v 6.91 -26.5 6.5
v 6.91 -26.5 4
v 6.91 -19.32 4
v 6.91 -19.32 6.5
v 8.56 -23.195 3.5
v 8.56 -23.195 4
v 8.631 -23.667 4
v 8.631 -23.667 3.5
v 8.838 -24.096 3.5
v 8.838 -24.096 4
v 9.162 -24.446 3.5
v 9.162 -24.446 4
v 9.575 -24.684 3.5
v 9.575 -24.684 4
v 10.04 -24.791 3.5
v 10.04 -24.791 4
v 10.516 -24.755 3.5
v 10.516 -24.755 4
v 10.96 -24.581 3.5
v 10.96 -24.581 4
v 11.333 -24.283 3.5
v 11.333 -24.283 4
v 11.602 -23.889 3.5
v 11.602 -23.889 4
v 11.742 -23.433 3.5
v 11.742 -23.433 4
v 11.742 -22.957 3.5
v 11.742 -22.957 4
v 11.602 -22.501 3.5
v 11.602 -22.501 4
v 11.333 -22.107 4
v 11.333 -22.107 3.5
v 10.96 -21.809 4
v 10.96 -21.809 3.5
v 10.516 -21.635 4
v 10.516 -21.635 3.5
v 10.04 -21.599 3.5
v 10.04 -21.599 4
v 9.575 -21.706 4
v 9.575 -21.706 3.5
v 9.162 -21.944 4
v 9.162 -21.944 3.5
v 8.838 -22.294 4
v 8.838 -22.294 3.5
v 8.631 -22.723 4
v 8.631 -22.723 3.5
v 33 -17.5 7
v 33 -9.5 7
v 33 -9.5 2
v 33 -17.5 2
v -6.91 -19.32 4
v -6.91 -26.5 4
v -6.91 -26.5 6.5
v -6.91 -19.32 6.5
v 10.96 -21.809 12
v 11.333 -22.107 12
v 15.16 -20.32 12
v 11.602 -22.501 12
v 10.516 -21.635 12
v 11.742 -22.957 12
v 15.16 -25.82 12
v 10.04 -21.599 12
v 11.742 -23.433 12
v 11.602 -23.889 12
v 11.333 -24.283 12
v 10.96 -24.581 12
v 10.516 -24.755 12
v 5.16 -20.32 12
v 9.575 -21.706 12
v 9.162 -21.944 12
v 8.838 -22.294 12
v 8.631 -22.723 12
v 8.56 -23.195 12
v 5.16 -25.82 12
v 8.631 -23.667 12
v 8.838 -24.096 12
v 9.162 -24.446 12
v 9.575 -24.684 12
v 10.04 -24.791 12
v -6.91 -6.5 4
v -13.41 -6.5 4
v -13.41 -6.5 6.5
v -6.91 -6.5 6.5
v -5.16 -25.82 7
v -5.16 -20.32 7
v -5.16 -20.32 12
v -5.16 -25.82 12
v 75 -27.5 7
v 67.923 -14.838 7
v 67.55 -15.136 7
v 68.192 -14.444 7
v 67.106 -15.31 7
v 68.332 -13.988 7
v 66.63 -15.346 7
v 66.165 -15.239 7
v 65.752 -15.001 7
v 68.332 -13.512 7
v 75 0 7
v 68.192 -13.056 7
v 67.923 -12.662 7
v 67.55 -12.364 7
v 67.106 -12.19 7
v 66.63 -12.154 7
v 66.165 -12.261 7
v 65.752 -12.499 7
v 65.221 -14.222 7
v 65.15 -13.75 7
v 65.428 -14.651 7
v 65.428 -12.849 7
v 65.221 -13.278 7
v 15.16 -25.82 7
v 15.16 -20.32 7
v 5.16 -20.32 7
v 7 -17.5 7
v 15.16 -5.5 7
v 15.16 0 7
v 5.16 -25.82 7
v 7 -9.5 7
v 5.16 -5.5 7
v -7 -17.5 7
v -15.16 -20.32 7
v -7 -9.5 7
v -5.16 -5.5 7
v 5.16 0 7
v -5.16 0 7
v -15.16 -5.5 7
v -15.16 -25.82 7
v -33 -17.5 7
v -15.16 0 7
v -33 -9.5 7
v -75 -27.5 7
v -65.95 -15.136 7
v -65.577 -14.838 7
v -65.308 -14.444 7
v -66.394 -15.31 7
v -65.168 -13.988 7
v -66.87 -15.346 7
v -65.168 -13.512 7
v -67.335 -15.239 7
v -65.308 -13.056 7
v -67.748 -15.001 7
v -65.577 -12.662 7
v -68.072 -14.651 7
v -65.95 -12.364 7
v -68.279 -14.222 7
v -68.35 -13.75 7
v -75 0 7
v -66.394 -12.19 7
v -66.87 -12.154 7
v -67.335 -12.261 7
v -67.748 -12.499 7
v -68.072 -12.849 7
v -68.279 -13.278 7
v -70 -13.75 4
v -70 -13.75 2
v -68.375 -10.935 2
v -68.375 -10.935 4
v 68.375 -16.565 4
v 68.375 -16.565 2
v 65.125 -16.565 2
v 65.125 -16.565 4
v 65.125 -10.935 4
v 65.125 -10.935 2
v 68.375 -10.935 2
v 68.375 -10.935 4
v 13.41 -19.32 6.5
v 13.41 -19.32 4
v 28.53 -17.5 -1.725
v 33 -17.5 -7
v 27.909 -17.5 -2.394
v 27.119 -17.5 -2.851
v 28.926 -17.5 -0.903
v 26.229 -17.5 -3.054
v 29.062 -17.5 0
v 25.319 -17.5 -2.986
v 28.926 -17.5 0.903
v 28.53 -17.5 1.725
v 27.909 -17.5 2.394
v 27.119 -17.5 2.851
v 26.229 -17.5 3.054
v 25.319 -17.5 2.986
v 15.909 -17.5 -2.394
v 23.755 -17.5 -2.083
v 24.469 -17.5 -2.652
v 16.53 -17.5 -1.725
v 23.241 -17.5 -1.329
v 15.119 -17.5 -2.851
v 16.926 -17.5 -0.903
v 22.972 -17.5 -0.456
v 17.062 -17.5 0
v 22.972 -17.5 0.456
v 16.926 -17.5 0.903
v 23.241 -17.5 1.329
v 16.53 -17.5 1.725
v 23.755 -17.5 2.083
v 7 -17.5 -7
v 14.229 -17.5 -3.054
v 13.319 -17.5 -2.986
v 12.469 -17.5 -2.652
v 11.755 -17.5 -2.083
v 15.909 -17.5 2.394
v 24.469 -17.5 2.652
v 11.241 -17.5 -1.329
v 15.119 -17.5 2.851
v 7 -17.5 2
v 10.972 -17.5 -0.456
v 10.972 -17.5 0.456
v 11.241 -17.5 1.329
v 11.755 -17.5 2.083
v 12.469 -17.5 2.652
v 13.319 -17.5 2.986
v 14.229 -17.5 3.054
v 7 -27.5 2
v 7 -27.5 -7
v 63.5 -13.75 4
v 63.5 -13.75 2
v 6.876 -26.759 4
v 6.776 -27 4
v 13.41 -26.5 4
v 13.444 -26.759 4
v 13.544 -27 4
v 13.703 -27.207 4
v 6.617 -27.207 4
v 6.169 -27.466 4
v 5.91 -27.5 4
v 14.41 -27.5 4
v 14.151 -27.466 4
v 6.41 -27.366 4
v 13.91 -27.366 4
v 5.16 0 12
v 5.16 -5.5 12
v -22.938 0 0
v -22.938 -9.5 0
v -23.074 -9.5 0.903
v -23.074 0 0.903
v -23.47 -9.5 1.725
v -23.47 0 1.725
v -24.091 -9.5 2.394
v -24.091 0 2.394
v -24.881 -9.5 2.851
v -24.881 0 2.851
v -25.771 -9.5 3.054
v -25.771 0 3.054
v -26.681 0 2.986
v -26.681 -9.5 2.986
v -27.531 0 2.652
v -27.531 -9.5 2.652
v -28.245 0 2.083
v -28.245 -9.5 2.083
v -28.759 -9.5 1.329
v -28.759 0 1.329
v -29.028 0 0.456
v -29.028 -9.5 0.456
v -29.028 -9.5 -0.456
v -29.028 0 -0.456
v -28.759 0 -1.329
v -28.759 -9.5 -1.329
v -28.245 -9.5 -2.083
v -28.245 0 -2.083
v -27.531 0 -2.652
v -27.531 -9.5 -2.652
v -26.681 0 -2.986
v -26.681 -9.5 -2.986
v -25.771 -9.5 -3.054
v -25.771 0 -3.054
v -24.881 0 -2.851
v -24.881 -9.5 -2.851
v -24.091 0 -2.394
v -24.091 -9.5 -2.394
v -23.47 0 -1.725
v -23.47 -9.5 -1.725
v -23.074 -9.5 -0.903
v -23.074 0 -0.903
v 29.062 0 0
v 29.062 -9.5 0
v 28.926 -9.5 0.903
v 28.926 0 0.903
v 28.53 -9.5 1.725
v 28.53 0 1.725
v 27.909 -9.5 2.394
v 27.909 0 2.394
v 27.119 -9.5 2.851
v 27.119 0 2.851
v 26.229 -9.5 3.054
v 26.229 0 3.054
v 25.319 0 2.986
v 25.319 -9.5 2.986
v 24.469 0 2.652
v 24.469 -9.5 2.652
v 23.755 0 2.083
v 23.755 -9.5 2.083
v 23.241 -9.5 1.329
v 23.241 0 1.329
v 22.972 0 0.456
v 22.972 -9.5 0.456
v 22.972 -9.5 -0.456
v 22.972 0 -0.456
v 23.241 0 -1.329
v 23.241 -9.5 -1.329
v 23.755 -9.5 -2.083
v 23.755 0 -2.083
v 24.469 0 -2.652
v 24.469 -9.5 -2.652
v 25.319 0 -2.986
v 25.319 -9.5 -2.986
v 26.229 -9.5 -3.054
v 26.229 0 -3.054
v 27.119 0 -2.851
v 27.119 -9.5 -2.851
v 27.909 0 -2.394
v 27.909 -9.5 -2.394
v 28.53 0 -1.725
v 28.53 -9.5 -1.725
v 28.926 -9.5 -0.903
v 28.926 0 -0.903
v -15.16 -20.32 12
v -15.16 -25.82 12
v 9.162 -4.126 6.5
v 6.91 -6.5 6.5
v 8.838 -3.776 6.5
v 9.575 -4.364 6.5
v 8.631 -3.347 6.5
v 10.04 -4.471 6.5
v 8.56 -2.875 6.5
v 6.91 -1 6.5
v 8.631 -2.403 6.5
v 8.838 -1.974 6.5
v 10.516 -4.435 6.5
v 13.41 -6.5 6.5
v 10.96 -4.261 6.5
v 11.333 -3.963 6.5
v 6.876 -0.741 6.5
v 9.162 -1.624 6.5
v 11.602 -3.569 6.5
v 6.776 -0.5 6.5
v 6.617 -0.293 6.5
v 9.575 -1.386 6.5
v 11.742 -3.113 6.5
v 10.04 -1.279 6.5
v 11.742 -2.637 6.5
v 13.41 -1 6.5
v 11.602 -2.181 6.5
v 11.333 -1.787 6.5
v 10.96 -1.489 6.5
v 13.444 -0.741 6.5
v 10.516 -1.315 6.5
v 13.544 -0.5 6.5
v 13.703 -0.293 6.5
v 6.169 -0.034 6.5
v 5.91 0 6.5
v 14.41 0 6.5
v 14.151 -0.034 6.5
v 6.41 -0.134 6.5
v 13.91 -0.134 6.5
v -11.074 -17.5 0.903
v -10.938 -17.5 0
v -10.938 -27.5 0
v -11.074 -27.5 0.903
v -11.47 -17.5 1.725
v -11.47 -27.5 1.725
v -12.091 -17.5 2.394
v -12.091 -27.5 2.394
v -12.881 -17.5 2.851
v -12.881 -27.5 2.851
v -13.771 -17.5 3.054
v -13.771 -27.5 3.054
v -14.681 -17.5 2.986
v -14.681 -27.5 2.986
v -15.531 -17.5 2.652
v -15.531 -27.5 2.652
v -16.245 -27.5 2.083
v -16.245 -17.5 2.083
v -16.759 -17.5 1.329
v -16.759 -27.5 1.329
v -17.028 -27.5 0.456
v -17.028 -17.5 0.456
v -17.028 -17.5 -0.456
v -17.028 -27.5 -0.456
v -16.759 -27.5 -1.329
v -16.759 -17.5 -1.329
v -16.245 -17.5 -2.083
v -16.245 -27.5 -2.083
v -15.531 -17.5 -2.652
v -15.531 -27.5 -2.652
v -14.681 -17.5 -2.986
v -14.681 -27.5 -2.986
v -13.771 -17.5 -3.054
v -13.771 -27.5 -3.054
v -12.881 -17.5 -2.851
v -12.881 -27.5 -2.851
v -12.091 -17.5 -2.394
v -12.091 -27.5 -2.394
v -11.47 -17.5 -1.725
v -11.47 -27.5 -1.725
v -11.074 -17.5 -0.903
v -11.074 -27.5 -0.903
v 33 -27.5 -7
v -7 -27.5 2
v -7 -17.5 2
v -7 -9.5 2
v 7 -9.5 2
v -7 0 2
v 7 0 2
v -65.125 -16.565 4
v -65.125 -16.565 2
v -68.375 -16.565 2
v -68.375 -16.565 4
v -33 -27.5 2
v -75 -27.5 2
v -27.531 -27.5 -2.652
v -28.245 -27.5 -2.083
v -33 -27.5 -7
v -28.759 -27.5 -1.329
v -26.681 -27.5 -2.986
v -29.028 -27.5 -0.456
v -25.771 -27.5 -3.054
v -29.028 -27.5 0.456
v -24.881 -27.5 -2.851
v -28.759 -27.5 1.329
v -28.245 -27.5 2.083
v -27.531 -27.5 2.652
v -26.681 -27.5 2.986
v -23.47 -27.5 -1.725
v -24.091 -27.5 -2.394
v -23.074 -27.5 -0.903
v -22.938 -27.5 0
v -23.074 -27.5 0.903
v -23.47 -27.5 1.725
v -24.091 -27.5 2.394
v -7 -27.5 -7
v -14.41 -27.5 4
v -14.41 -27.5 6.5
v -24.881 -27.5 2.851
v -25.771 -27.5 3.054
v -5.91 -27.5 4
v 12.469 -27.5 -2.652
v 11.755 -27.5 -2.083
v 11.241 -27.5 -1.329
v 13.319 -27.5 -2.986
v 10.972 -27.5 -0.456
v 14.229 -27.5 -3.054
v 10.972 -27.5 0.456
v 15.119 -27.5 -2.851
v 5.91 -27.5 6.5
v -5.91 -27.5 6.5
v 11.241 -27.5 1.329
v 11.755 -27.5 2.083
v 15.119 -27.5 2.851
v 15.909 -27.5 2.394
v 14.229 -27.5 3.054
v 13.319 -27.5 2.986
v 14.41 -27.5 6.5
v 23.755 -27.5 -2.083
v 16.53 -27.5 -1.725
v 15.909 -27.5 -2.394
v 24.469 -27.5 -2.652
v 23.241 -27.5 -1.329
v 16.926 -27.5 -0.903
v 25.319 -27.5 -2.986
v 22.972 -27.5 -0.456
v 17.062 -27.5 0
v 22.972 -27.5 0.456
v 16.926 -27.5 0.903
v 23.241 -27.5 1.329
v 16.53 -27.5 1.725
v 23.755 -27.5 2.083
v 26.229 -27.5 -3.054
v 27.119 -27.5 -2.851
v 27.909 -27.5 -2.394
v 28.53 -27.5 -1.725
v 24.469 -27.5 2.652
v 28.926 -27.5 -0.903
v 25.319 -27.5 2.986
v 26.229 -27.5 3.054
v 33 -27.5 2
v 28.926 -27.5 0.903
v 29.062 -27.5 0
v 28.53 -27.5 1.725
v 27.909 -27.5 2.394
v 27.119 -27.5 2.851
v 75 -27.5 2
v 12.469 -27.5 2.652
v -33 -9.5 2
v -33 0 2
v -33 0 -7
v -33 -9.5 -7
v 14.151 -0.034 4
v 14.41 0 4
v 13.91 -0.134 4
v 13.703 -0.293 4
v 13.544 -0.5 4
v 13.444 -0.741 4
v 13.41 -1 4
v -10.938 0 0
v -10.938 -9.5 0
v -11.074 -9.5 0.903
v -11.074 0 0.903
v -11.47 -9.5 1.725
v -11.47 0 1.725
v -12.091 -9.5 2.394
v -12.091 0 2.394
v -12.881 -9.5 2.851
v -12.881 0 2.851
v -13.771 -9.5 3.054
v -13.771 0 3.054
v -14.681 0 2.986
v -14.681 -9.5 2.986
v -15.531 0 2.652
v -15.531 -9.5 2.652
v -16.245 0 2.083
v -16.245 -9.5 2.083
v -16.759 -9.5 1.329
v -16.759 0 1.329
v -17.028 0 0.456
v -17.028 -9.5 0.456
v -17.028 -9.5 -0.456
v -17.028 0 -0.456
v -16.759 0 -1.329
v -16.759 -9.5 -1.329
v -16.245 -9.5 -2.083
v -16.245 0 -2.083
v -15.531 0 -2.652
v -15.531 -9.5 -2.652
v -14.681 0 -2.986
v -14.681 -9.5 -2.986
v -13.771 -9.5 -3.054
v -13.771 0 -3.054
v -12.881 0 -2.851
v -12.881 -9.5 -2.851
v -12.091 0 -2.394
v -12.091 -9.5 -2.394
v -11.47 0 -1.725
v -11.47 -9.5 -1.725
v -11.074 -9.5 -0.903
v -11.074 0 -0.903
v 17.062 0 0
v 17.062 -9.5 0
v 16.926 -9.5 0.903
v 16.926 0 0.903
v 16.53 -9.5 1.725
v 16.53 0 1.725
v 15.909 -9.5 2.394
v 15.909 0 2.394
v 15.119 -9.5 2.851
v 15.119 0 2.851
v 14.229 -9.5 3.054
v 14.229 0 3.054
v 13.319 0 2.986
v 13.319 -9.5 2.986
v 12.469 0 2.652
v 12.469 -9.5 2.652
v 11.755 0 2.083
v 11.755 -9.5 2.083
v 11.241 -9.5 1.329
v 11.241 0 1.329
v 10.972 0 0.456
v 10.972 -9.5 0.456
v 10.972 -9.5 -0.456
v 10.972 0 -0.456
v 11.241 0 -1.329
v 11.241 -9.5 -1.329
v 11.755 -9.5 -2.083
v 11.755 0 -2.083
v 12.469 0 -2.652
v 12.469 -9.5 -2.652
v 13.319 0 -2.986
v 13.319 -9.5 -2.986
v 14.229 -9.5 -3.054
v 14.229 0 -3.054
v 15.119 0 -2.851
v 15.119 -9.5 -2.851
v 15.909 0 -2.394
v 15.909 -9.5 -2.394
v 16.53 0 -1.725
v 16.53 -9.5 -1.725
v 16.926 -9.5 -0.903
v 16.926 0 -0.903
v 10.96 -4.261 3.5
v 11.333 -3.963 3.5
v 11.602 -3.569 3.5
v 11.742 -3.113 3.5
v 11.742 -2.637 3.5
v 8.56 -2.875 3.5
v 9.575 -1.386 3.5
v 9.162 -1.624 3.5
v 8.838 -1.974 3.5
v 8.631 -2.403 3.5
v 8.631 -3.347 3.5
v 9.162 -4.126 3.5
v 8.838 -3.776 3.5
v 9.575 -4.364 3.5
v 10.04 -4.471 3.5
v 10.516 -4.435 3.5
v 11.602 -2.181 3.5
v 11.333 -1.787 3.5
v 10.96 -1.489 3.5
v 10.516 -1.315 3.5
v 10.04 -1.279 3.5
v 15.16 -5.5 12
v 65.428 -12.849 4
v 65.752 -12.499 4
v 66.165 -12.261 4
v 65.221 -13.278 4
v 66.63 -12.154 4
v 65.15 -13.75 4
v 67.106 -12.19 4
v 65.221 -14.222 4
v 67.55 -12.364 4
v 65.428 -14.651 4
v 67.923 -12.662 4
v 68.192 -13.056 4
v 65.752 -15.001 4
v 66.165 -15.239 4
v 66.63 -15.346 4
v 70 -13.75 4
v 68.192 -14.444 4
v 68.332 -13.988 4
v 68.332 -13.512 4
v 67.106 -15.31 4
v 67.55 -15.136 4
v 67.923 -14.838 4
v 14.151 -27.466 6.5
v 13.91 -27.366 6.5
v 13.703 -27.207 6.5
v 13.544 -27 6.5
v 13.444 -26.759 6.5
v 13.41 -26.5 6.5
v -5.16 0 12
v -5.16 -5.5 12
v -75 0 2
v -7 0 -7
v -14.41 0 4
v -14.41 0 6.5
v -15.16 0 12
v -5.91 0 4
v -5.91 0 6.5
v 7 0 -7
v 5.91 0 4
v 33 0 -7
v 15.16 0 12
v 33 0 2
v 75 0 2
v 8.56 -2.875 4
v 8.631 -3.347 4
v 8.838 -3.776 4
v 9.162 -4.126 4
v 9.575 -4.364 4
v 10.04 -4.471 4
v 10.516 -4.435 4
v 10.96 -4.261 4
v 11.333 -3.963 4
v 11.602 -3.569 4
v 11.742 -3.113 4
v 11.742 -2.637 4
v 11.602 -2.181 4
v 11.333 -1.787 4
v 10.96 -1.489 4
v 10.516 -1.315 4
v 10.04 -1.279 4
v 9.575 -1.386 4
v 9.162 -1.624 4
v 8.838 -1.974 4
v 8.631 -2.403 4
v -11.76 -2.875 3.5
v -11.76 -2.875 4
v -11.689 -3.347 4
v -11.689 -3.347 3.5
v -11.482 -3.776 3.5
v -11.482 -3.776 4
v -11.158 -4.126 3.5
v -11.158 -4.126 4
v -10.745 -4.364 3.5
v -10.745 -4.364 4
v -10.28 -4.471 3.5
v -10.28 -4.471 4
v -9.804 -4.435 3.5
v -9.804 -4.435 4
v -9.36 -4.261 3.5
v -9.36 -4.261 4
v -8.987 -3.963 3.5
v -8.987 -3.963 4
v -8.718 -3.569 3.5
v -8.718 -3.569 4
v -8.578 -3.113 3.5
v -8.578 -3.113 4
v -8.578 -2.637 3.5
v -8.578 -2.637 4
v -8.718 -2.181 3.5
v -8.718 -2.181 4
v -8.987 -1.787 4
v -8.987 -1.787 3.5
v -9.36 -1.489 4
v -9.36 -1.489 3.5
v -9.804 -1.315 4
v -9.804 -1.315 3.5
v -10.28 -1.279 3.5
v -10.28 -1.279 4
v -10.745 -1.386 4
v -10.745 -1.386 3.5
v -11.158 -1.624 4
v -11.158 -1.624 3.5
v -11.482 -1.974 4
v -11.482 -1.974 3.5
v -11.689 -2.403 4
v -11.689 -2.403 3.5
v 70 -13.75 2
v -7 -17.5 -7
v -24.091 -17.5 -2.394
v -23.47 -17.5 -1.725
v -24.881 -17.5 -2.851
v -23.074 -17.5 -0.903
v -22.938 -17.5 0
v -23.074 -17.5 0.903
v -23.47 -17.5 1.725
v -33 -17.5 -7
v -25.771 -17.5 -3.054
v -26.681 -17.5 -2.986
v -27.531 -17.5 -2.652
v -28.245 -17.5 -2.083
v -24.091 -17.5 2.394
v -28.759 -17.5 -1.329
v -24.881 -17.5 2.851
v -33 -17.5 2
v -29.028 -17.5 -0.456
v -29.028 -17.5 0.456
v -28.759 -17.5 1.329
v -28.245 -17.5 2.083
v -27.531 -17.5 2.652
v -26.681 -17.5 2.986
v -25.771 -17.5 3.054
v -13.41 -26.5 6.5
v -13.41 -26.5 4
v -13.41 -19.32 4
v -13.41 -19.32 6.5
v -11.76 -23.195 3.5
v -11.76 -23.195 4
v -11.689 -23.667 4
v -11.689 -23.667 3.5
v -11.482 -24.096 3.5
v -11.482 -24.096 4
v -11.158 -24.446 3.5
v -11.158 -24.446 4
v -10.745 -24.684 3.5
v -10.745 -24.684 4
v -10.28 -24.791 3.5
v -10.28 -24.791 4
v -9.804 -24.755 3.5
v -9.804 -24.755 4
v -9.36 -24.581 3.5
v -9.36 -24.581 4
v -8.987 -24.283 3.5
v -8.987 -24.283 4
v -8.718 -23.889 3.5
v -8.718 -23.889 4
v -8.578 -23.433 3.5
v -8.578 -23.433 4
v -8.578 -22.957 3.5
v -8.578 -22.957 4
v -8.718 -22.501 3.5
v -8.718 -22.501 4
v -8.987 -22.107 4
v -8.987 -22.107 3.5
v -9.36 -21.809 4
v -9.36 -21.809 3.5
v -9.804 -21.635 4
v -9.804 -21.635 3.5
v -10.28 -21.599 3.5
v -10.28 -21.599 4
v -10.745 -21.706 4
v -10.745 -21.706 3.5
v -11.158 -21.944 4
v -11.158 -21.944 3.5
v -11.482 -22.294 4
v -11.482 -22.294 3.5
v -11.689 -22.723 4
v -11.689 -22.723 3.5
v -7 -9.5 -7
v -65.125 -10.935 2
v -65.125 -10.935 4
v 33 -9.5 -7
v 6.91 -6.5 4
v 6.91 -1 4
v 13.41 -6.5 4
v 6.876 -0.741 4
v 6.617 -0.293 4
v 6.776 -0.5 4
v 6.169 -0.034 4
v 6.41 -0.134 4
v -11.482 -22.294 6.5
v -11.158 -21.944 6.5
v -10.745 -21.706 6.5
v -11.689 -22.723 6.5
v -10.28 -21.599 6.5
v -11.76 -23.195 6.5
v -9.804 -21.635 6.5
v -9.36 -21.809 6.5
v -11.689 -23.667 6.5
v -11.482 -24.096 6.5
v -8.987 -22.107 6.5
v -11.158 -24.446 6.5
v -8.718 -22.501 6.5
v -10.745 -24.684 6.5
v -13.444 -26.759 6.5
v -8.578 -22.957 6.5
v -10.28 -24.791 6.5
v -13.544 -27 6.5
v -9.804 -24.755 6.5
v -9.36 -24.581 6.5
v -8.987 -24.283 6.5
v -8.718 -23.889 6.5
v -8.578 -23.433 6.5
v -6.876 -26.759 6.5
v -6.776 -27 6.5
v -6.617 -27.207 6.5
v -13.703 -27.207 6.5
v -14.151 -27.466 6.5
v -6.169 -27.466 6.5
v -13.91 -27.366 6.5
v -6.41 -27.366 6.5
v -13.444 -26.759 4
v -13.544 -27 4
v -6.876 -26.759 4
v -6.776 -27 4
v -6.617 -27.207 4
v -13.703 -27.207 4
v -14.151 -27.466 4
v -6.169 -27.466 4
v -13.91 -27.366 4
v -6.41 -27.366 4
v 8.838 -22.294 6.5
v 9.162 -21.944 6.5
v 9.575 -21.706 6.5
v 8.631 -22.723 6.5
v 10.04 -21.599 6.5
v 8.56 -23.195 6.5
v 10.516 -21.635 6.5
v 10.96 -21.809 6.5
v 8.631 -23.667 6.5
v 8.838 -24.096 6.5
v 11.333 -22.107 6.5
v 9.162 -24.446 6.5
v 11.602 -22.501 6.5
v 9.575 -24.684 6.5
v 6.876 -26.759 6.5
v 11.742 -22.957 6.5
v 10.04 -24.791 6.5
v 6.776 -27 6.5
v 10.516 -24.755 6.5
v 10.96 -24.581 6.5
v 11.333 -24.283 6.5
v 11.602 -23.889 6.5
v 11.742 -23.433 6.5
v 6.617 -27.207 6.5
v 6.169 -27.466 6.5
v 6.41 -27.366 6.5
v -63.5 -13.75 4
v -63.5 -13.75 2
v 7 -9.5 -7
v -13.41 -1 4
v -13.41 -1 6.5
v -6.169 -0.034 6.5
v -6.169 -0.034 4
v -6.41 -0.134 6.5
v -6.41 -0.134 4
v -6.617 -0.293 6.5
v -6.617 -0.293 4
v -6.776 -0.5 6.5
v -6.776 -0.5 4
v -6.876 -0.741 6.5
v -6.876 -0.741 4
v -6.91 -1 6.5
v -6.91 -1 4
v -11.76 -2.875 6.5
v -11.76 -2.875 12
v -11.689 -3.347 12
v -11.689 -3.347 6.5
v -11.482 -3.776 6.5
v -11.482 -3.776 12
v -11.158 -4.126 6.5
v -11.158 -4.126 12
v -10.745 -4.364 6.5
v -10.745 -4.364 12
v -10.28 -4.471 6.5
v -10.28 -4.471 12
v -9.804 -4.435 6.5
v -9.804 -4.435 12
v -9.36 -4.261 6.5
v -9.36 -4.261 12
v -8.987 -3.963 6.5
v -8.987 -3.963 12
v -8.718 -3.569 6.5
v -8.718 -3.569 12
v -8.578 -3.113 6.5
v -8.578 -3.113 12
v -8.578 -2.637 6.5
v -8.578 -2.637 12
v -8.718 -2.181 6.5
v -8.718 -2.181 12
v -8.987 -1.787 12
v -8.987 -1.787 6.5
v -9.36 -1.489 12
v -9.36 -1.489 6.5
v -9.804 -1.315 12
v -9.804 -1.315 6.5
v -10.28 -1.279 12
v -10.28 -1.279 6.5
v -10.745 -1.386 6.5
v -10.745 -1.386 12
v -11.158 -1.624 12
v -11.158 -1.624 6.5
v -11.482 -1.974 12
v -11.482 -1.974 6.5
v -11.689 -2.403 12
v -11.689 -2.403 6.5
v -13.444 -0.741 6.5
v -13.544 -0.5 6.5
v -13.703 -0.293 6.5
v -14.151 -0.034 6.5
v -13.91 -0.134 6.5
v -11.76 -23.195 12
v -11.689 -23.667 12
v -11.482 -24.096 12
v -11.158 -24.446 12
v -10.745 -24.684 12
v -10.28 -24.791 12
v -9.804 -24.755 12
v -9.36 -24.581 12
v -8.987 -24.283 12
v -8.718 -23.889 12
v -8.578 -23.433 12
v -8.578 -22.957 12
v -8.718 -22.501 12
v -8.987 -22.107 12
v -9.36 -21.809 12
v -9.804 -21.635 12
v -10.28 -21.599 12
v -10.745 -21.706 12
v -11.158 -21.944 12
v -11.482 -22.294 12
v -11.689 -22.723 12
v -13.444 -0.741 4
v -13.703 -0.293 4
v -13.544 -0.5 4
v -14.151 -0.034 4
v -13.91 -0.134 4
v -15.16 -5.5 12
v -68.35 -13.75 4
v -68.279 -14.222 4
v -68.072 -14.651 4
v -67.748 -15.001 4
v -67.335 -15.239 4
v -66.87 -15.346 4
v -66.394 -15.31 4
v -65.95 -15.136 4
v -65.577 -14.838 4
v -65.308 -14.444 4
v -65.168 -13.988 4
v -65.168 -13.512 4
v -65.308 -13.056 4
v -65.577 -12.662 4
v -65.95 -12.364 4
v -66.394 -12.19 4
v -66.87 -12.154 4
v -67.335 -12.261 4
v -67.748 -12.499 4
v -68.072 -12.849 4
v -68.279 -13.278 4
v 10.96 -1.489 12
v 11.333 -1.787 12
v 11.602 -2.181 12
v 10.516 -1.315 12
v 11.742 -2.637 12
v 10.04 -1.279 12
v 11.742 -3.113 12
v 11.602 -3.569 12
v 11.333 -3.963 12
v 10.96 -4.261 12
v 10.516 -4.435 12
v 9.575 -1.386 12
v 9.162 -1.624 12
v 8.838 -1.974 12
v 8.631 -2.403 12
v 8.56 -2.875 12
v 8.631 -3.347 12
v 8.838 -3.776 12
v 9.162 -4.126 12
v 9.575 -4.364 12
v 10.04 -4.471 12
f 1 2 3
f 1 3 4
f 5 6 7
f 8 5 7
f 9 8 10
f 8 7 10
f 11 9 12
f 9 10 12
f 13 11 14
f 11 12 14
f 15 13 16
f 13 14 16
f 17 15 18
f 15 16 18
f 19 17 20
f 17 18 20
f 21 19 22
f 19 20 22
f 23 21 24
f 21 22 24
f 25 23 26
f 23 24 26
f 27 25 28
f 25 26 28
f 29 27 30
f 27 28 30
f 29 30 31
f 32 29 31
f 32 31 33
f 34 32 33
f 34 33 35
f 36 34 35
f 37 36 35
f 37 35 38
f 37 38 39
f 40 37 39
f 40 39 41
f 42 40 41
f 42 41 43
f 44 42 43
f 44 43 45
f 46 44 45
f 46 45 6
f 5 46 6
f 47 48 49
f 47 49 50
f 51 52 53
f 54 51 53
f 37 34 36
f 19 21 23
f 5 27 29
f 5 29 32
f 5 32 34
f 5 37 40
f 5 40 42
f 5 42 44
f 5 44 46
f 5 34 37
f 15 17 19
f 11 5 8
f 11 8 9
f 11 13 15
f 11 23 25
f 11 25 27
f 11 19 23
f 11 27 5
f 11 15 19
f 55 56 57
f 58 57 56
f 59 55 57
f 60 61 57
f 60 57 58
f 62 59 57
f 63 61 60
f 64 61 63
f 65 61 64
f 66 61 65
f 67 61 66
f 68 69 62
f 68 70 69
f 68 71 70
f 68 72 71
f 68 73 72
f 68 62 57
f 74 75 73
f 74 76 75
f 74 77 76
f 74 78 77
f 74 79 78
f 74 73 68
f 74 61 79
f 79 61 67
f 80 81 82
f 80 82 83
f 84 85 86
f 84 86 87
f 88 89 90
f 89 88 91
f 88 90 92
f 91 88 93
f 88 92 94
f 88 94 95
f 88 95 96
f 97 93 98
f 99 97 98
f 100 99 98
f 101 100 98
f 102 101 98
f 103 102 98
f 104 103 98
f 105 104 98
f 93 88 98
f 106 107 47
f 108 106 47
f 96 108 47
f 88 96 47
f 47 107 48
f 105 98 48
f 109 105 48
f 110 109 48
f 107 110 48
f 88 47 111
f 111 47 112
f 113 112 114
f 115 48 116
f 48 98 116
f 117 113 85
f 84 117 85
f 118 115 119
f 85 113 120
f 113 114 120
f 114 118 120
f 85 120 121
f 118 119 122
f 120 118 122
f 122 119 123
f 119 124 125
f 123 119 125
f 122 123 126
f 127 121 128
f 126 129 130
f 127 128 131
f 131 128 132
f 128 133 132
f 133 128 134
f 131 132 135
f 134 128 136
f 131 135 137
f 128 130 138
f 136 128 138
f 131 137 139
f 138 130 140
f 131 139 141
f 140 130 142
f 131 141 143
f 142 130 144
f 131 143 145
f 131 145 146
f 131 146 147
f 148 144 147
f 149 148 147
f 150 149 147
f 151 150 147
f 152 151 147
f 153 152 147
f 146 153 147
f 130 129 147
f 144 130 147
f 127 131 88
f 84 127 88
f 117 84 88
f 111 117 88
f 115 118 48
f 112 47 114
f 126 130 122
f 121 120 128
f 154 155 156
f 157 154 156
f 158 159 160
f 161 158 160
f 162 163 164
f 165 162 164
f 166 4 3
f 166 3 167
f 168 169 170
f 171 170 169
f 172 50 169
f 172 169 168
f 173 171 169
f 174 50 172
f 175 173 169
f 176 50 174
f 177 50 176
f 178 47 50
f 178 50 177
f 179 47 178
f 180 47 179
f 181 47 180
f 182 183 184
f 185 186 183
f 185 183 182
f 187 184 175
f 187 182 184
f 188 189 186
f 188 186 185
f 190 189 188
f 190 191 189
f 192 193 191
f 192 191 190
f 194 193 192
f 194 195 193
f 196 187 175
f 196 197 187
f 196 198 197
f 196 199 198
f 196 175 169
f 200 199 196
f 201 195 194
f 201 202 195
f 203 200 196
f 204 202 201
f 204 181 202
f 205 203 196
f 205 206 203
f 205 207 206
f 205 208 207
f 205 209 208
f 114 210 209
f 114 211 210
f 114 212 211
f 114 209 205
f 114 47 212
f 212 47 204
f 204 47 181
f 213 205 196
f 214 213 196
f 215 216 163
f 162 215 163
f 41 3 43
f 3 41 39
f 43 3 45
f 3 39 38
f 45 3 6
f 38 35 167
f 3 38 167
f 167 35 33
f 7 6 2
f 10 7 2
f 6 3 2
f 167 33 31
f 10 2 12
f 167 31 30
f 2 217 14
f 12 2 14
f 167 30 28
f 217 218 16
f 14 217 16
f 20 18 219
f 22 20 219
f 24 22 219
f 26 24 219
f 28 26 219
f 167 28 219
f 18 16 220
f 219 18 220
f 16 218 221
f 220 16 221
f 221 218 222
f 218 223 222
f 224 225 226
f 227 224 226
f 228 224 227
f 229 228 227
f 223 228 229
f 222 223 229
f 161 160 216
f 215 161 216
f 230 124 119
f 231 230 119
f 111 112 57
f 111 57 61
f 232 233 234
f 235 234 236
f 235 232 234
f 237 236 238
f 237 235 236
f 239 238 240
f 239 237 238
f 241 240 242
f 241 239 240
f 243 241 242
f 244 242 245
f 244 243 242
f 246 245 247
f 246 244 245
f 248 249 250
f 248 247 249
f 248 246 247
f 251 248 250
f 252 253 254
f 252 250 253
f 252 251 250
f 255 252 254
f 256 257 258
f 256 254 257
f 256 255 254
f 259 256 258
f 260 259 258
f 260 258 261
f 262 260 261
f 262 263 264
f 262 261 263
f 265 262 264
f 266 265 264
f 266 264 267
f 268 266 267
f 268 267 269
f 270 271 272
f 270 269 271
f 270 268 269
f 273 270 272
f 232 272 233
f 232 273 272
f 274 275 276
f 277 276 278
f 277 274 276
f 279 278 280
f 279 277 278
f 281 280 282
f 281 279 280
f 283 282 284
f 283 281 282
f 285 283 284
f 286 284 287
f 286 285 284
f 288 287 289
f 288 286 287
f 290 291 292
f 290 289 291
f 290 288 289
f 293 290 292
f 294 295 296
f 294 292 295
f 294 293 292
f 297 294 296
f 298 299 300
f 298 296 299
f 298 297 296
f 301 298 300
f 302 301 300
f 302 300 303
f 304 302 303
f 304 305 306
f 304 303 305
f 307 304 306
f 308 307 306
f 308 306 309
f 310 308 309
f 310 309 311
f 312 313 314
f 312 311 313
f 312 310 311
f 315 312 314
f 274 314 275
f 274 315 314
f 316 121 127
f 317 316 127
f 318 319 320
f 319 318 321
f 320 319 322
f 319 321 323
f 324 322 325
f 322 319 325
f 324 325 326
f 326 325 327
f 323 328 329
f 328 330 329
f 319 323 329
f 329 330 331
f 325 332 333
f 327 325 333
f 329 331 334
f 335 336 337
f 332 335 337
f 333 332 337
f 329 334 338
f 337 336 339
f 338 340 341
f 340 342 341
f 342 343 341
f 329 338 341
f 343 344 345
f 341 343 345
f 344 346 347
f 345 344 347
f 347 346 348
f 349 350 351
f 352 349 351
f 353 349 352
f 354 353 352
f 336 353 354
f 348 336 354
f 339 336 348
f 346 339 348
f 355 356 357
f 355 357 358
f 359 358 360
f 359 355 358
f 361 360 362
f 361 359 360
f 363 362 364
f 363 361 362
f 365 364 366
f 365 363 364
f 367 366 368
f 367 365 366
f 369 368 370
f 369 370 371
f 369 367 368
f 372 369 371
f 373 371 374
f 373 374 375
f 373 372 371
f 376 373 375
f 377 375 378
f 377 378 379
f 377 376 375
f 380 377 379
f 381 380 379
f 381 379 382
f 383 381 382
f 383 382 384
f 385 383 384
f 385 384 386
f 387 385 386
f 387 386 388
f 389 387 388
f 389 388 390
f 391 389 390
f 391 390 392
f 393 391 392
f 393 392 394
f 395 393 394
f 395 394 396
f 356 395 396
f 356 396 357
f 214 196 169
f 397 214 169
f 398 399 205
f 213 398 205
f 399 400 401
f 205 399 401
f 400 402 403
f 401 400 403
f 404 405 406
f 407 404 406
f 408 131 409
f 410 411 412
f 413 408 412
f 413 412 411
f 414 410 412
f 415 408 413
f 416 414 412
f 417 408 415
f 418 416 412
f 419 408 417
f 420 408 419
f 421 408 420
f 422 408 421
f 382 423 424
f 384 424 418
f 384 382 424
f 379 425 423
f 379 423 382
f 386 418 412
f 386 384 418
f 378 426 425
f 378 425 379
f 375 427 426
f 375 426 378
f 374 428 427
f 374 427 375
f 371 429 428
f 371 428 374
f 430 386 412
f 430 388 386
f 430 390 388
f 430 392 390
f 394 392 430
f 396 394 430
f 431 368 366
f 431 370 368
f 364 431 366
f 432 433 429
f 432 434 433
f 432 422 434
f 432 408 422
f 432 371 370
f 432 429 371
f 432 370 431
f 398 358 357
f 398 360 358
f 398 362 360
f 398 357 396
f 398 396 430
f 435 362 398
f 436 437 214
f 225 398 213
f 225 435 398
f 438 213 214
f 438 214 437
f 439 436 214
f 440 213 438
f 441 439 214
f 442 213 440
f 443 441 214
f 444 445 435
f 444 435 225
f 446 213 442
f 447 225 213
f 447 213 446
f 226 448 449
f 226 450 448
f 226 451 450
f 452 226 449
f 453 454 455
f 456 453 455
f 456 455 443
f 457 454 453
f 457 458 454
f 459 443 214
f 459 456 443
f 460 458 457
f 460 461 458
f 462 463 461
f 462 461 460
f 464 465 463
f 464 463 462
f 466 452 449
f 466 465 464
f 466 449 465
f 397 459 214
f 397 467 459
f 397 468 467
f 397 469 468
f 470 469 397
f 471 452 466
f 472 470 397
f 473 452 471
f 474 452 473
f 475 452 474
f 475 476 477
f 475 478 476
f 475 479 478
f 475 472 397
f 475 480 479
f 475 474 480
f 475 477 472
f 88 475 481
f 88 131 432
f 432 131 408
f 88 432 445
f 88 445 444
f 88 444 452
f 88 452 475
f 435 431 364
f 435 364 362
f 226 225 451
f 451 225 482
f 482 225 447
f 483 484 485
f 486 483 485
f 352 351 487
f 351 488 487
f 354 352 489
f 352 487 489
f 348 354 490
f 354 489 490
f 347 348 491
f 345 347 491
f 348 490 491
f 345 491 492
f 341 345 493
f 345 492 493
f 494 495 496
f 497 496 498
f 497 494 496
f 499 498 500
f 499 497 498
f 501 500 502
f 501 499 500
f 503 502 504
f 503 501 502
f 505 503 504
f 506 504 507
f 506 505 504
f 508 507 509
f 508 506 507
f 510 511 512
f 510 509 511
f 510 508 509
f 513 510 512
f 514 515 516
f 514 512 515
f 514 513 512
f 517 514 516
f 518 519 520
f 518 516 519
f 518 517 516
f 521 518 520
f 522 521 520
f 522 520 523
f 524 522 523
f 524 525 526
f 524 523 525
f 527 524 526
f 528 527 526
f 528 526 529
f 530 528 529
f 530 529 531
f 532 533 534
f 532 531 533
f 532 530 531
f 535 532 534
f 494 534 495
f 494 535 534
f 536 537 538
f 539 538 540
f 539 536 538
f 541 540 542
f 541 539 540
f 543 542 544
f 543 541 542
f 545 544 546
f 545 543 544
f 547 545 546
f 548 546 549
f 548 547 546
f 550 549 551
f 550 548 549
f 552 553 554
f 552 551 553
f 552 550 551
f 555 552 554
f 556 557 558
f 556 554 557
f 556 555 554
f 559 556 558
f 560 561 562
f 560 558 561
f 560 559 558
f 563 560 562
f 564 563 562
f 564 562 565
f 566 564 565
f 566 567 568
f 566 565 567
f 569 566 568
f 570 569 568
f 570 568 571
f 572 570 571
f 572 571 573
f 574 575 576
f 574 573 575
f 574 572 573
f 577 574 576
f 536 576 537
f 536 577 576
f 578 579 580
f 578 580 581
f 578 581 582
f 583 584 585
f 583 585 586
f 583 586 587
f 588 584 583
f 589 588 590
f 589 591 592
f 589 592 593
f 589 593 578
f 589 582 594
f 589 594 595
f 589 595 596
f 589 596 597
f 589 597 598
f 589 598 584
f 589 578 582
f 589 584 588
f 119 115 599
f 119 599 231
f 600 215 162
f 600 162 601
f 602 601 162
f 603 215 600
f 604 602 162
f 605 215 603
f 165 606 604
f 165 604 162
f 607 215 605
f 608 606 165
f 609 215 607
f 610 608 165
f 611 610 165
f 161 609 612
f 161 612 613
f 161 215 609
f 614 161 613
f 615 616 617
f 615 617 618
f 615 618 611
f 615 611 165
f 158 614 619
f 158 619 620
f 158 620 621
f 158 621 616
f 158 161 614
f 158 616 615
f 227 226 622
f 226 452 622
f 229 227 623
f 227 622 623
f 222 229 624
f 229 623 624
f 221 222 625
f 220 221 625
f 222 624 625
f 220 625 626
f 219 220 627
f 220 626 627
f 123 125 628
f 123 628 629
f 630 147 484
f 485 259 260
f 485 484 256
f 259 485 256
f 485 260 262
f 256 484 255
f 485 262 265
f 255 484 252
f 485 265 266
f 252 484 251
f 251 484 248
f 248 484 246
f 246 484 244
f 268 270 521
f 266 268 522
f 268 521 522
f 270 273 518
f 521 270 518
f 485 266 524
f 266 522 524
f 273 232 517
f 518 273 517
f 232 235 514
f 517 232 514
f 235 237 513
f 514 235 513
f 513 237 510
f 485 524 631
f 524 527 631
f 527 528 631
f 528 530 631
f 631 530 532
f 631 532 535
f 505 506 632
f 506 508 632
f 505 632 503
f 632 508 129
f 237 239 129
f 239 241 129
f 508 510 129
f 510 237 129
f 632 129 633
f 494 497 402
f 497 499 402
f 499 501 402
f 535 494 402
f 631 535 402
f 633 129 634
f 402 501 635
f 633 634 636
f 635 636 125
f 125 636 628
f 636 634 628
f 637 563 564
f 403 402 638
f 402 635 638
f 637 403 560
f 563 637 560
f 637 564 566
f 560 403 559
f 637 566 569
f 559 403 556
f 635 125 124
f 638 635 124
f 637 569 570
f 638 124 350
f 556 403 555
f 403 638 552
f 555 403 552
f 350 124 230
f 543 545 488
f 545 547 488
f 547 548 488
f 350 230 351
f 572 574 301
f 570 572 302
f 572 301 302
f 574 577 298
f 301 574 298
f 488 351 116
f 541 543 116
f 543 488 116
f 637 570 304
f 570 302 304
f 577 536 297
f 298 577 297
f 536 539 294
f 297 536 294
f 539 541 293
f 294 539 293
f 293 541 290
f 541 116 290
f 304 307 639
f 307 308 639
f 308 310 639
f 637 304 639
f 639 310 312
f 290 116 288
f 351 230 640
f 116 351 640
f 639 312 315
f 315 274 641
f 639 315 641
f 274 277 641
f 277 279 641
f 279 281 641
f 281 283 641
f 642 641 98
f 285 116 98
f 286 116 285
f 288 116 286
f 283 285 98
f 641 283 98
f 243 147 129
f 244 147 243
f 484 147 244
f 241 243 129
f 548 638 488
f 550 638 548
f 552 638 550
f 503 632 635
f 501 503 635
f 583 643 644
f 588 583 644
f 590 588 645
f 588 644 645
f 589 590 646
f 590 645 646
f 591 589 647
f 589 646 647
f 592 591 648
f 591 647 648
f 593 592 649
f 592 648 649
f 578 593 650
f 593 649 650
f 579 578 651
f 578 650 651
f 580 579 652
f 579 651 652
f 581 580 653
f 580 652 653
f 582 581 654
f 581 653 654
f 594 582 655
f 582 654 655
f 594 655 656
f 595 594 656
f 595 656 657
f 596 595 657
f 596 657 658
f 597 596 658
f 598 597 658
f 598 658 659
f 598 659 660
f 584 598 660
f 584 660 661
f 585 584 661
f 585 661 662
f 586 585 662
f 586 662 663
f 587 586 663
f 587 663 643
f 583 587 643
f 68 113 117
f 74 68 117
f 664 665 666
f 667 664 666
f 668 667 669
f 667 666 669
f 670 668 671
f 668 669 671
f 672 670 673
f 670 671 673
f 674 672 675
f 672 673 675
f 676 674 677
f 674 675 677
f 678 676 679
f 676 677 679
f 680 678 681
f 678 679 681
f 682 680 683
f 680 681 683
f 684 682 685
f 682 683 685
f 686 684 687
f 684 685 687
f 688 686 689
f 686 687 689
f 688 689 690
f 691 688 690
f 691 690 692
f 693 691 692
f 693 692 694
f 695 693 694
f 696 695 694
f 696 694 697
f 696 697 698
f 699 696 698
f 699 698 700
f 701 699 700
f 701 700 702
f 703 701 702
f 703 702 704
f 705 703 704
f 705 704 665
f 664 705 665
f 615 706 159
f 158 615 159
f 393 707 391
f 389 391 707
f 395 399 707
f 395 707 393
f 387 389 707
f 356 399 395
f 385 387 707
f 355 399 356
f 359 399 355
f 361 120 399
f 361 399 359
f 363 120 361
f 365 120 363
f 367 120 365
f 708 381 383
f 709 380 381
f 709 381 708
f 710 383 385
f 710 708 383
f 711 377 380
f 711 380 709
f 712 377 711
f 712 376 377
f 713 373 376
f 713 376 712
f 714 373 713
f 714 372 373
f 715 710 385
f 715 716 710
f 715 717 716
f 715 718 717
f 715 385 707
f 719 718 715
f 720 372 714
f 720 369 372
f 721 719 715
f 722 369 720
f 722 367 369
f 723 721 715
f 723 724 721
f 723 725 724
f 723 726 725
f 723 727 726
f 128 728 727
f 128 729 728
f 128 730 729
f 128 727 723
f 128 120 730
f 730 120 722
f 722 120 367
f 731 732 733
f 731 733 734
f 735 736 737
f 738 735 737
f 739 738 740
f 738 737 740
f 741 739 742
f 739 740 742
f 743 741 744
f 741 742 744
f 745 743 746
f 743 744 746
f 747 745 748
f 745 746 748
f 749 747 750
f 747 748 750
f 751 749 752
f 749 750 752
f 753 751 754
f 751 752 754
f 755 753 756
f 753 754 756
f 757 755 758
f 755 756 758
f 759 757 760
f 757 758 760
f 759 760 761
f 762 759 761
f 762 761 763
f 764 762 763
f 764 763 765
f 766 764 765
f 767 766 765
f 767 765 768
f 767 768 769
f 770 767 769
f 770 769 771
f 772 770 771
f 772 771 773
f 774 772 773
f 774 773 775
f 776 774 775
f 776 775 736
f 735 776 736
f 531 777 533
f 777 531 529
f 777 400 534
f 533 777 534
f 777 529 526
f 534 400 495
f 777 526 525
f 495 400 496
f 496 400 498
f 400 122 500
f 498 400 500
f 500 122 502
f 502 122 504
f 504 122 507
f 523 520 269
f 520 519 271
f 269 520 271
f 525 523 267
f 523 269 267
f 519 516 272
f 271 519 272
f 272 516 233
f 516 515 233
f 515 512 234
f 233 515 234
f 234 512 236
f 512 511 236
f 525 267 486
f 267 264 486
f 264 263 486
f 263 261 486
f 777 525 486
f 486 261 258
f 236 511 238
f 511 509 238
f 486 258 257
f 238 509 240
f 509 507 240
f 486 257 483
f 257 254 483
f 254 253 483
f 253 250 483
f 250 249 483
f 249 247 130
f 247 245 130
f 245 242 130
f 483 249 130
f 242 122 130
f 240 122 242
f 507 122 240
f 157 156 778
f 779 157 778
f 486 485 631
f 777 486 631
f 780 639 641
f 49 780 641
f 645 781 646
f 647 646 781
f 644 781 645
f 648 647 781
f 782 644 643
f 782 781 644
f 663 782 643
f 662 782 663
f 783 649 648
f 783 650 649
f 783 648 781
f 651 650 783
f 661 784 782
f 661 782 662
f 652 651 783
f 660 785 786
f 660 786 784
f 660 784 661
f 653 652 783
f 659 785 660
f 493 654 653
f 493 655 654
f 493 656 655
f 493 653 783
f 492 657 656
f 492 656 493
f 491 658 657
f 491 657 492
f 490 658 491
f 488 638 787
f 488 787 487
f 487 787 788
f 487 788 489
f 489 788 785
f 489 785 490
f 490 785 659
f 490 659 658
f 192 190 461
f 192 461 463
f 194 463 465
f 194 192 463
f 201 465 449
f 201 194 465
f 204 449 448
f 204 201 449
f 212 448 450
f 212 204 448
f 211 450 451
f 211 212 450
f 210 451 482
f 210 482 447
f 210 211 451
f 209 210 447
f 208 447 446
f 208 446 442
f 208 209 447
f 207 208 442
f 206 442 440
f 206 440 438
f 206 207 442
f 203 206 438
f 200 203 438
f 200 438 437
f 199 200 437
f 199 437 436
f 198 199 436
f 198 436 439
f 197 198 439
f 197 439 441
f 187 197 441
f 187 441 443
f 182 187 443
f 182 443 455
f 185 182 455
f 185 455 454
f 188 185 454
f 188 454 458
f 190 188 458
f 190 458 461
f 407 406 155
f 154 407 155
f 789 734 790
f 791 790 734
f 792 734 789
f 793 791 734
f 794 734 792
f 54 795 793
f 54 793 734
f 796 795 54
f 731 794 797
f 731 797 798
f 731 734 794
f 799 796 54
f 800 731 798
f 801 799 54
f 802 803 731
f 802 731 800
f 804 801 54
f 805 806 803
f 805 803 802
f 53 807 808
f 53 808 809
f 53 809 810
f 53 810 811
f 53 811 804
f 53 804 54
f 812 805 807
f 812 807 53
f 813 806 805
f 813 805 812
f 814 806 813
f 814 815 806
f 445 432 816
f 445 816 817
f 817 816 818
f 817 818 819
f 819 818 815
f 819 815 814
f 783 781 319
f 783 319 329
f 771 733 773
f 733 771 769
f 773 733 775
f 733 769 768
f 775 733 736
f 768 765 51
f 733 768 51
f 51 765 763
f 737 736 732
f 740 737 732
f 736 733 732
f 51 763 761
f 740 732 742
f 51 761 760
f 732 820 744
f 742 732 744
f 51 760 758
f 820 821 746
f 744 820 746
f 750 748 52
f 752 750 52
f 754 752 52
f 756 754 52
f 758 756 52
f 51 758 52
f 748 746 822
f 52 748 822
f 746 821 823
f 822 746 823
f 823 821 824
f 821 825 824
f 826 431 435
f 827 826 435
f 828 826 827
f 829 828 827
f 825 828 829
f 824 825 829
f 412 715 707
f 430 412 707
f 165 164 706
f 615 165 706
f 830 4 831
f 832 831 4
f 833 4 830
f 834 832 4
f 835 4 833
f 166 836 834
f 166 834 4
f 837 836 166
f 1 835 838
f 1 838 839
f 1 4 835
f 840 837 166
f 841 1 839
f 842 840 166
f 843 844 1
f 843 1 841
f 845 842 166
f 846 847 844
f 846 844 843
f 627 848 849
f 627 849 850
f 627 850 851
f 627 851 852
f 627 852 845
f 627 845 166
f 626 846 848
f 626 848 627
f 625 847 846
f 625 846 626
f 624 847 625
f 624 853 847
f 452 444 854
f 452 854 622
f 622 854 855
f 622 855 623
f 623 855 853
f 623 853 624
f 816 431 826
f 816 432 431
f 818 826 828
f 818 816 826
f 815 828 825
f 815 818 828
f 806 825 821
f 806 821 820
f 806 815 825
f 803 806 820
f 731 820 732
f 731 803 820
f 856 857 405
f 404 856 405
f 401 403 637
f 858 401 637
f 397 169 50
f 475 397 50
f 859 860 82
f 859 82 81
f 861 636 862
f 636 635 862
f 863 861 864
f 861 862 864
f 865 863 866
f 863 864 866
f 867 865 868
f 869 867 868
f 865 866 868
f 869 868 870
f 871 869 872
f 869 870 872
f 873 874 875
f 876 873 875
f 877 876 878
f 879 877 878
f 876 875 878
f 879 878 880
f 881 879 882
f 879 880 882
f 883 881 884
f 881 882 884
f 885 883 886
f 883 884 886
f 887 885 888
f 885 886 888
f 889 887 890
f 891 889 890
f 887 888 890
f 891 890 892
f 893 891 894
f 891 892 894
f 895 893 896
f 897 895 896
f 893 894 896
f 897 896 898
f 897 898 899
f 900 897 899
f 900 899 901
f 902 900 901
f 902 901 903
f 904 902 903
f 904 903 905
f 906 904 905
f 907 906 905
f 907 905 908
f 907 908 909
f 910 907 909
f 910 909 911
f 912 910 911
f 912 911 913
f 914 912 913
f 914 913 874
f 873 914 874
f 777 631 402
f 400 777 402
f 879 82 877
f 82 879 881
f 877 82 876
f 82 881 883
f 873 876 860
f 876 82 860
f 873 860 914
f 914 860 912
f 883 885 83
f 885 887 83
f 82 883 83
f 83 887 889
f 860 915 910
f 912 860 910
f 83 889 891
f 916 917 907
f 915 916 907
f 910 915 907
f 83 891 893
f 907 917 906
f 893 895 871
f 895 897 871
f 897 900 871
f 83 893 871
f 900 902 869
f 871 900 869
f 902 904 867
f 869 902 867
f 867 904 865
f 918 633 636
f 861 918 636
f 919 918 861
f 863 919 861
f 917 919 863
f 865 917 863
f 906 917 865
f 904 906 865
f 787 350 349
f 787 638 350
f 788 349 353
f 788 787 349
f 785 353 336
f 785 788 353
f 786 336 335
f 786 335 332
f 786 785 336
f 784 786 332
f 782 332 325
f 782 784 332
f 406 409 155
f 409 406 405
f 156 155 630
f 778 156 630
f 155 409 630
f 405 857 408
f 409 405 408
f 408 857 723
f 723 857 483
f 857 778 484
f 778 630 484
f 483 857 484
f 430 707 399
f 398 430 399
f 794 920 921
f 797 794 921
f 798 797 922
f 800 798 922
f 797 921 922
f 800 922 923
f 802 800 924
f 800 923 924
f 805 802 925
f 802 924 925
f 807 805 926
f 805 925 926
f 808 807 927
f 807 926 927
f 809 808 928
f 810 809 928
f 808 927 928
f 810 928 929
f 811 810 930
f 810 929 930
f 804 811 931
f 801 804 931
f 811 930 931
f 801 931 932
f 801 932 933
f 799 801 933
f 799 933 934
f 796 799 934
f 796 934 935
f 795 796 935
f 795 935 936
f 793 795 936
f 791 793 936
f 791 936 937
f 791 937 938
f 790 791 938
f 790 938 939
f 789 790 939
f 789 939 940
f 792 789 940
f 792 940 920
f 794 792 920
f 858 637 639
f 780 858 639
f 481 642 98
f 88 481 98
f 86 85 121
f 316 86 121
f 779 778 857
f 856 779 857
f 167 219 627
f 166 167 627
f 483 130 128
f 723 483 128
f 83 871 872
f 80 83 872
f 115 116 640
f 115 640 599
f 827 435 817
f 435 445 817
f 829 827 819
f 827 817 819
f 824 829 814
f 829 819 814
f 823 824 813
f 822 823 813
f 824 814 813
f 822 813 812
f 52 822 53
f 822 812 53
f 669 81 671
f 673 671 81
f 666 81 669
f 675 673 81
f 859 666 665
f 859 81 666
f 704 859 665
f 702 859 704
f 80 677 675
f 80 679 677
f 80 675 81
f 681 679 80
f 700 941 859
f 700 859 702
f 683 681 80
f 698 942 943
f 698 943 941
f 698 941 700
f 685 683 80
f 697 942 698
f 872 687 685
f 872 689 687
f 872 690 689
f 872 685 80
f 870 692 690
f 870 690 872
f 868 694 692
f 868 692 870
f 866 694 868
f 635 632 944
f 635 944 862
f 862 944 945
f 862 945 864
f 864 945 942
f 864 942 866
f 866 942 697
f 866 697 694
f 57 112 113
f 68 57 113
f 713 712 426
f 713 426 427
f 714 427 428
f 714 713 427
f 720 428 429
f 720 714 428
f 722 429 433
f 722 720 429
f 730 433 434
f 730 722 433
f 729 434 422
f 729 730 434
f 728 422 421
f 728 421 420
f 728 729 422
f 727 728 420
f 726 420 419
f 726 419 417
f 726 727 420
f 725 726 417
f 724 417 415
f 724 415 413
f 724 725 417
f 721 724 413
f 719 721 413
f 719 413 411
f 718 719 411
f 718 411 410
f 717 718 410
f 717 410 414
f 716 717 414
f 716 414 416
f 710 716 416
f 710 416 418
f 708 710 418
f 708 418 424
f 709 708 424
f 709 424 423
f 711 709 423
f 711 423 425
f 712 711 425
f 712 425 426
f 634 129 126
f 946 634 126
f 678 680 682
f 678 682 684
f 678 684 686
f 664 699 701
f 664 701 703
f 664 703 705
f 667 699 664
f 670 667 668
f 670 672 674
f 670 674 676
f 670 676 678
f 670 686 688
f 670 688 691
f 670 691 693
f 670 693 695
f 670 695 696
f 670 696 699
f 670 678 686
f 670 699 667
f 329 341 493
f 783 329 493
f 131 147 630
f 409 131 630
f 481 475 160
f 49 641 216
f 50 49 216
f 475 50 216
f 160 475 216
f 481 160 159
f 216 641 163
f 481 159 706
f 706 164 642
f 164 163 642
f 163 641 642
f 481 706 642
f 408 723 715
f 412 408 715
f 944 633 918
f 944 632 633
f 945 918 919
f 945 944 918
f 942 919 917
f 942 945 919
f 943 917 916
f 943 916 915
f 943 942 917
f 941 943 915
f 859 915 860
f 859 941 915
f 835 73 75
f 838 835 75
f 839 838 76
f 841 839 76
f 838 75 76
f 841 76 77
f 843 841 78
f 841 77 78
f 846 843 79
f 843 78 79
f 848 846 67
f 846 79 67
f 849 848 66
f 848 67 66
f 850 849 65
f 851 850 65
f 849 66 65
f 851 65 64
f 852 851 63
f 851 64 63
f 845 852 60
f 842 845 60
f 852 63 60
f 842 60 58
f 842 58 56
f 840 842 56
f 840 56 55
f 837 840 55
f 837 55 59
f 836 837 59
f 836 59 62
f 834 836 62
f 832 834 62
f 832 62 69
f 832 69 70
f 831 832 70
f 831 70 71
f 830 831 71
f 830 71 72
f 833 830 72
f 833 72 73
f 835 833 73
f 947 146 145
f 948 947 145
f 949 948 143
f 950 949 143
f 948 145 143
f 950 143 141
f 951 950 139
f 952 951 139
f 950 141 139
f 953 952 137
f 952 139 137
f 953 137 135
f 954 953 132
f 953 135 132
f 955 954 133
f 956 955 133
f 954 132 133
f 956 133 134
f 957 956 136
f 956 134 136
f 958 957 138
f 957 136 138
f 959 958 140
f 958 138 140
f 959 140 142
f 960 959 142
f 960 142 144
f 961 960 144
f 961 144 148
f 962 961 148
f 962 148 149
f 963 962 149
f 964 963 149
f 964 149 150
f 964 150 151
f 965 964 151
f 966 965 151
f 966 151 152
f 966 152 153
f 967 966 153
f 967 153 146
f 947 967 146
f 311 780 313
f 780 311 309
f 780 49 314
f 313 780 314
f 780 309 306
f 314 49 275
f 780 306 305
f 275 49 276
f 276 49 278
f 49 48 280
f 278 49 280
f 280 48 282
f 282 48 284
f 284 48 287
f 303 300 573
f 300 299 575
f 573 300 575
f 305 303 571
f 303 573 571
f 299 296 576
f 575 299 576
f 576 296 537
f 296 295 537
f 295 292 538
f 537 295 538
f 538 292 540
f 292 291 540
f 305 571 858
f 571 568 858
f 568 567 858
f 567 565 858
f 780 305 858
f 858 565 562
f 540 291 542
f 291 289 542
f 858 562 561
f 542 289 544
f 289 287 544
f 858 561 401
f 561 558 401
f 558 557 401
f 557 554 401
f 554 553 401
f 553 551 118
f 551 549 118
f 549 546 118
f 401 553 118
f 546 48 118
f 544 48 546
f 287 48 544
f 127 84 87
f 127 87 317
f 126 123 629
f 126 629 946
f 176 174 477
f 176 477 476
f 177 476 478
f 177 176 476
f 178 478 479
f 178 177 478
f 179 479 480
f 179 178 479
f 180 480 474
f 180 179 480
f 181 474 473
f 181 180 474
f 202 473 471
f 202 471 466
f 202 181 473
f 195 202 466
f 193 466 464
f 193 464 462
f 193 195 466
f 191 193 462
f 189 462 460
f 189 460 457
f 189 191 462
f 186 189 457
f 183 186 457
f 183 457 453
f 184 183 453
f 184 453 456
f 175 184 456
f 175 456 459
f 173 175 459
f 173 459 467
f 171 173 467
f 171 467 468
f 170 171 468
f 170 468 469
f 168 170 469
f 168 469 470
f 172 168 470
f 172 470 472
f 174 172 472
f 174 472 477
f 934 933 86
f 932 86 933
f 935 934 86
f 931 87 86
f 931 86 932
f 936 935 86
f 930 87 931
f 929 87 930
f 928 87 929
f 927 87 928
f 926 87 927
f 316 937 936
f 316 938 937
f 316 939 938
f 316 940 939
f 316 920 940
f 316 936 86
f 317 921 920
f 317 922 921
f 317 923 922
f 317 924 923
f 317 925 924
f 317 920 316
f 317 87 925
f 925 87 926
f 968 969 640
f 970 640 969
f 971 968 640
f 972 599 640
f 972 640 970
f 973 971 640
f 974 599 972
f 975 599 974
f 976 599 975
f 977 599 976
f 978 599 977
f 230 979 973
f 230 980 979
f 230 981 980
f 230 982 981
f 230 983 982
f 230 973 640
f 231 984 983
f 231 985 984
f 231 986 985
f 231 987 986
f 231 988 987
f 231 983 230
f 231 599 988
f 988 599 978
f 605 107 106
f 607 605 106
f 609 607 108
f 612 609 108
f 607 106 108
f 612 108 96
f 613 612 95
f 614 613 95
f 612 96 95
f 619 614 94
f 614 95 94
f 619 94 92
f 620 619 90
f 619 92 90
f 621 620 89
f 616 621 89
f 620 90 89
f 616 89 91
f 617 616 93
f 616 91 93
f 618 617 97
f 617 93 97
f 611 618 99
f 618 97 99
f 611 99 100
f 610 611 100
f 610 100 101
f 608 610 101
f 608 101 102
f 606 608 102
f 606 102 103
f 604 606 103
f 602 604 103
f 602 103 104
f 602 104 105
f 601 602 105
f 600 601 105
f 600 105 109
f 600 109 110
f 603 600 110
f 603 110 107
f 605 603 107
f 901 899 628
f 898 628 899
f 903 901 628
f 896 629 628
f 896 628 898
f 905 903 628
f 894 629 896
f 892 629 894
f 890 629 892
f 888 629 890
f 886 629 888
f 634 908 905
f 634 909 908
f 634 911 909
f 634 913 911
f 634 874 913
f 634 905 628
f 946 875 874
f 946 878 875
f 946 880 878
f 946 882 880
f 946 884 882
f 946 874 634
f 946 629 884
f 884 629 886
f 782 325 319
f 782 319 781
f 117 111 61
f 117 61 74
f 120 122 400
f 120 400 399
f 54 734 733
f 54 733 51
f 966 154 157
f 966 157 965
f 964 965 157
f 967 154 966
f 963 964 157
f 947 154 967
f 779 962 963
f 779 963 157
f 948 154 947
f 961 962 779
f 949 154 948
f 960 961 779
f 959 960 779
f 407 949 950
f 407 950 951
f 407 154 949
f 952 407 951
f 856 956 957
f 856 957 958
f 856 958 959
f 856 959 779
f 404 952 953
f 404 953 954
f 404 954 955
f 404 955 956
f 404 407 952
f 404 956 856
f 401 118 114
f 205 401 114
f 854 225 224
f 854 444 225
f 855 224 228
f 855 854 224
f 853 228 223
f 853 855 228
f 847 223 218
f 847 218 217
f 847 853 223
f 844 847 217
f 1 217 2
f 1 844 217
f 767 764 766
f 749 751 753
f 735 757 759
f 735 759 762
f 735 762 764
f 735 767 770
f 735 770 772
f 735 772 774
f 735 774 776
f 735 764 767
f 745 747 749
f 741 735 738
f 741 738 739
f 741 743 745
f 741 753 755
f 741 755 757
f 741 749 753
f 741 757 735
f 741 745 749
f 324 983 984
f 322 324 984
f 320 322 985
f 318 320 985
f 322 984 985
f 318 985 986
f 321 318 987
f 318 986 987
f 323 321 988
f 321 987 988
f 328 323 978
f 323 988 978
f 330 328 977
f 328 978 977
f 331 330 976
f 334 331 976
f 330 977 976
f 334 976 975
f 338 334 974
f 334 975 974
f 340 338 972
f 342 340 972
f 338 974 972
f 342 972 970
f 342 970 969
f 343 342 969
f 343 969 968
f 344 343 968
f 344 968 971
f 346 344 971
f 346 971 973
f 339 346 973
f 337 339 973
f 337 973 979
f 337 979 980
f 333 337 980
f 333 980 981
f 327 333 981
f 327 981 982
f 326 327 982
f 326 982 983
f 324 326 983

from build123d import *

# Parameters (mm, degrees)
SKETCH042_R     = 3.0625
PAD006_DEPTH    = 27.5
SKETCH043_R     = 1.6
POCKET027_DEPTH = 5
POCKET028_DEPTH = 2
SKETCH046_W     = 26
SKETCH046_H     = 8
POCKET029_DEPTH = 14
SKETCH047_W     = 10
SKETCH047_H     = 5.5
PAD007_DEPTH    = 5
SKETCH048_R     = 1.6
POCKET030_DEPTH = 8.5
SKETCH049_W     = 6.5
SKETCH049_H     = 2.5
POCKET031_DEPTH = 6.5
SKETCH050_W     = 6.5
SKETCH050_H     = 2.5
POCKET032_DEPTH = 8.18
FILLET002_R     = 1


with BuildPart() as part:
    # Sketch042 → Pad006 (new body)
    with BuildSketch(Plane.XZ):
        Polygon((33, -7), (33, 2), (75, 2), (75, 7), (-75, 7), (-75, 2), (-33, 2), (-33, -7), (-7, -7), (-7, 2), (7, 2), (7, -7), align=None)
        with Locations((-14, 0)):
            Circle(SKETCH042_R, mode=Mode.SUBTRACT)
        with Locations((14, 0)):
            Circle(SKETCH042_R, mode=Mode.SUBTRACT)
        with Locations((-26, 0)):
            Circle(SKETCH042_R, mode=Mode.SUBTRACT)
        with Locations((26, 0)):
            Circle(SKETCH042_R, mode=Mode.SUBTRACT)
    extrude(amount=PAD006_DEPTH)

    # Sketch043 (on Face4 of Pad006) → Pocket027 (cut)
    with BuildSketch(Plane(origin=(0, 0, 7), x_dir=(-1, 0, 0), z_dir=(0, 0, 1))):
        with Locations((-66.75, 13.75)):
            Circle(SKETCH043_R)
        with Locations((66.75, 13.75)):
            Circle(SKETCH043_R)
    extrude(amount=-POCKET027_DEPTH, mode=Mode.SUBTRACT)

    # Sketch045 (on Face11 of Pocket027) → Pocket028 (cut)
    with BuildSketch(Plane(origin=(0, 0, 2), x_dir=(1, 0, 0), z_dir=(0, 0, -1))):
        Polygon((-63.5, 13.75), (-65.125, 16.5645825623), (-68.375, 16.5645825623), (-70, 13.75), (-68.375, 10.9354174377), (-65.125, 10.9354174377), align=None)
        Polygon((70, 13.75), (68.375, 16.5645825623), (65.125, 16.5645825623), (63.5, 13.75), (65.125, 10.9354174377), (68.375, 10.9354174377), align=None)
    extrude(amount=-POCKET028_DEPTH, mode=Mode.SUBTRACT)

    # Sketch046 (on Face14 of Pocket028) → Pocket029 (cut)
    with BuildSketch(Plane(origin=(0, 0, 7), x_dir=(-1, 0, 0), z_dir=(0, 0, 1))):
        with Locations((-20, 13.5)):
            Rectangle(SKETCH046_W, SKETCH046_H)
        with Locations((20, 13.5)):
            Rectangle(SKETCH046_W, SKETCH046_H)
    extrude(amount=-POCKET029_DEPTH, mode=Mode.SUBTRACT)

    # Sketch047 (on Face7 of Pocket022) → Pad007 (join)
    with BuildSketch(Plane(origin=(0, 0, 7), x_dir=(-1, 0, 0), z_dir=(0, 0, 1))):
        with Locations((-10.16, 23.07)):
            Rectangle(SKETCH047_W, SKETCH047_H)
        with Locations((10.16, 23.07)):
            Rectangle(SKETCH047_W, SKETCH047_H)
        with Locations((-10.16, 2.75)):
            Rectangle(SKETCH047_W, SKETCH047_H)
        with Locations((10.16, 2.75)):
            Rectangle(SKETCH047_W, SKETCH047_H)
    extrude(amount=PAD007_DEPTH)

    # Sketch048 (on Face52 of Pad007) → Pocket030 (cut)
    with BuildSketch(Plane(origin=(0, 0, 12), x_dir=(-1, 0, 0), z_dir=(0, 0, 1))):
        with Locations((-10.16, 23.195)):
            Circle(SKETCH048_R)
        with Locations((-10.16, 2.875)):
            Circle(SKETCH048_R)
        with Locations((10.16, 23.195)):
            Circle(SKETCH048_R)
        with Locations((10.16, 2.875)):
            Circle(SKETCH048_R)
    extrude(amount=-POCKET030_DEPTH, mode=Mode.SUBTRACT)

    # Sketch049 (on Face2 of Pocket030) → Pocket031 (cut)
    with BuildSketch(Plane(origin=(0, 0, 0), x_dir=(1, 0, 0), z_dir=(0, 1, 0))):
        with Locations((-10.16, -5.25)):
            Rectangle(SKETCH049_W, SKETCH049_H)
        with Locations((10.16, -5.25)):
            Rectangle(SKETCH049_W, SKETCH049_H)
    extrude(amount=-POCKET031_DEPTH, mode=Mode.SUBTRACT)

    # Sketch050 (on Face31 of Pocket031) → Pocket032 (cut)
    with BuildSketch(Plane.XZ.offset(27.5)):
        with Locations((-10.16, 5.25)):
            Rectangle(SKETCH050_W, SKETCH050_H)
        with Locations((10.16, 5.25)):
            Rectangle(SKETCH050_W, SKETCH050_H)
    extrude(amount=-POCKET032_DEPTH, mode=Mode.SUBTRACT)

    # Fillet002
    fillet002_edges = [part.edges().sort_by_distance(p)[0] for p in [
        (-13.41, -27.5, 5.25),
        (-6.91, -27.5, 5.25),
        (6.91, -27.5, 5.25),
        (13.41, -27.5, 5.25),
        (13.41, 0, 5.25),
        (6.91, 0, 5.25),
        (-6.91, 0, 5.25),
        (-13.41, 0, 5.25),
    ]]
    fillet(fillet002_edges, radius=FILLET002_R)


solid = part.part
